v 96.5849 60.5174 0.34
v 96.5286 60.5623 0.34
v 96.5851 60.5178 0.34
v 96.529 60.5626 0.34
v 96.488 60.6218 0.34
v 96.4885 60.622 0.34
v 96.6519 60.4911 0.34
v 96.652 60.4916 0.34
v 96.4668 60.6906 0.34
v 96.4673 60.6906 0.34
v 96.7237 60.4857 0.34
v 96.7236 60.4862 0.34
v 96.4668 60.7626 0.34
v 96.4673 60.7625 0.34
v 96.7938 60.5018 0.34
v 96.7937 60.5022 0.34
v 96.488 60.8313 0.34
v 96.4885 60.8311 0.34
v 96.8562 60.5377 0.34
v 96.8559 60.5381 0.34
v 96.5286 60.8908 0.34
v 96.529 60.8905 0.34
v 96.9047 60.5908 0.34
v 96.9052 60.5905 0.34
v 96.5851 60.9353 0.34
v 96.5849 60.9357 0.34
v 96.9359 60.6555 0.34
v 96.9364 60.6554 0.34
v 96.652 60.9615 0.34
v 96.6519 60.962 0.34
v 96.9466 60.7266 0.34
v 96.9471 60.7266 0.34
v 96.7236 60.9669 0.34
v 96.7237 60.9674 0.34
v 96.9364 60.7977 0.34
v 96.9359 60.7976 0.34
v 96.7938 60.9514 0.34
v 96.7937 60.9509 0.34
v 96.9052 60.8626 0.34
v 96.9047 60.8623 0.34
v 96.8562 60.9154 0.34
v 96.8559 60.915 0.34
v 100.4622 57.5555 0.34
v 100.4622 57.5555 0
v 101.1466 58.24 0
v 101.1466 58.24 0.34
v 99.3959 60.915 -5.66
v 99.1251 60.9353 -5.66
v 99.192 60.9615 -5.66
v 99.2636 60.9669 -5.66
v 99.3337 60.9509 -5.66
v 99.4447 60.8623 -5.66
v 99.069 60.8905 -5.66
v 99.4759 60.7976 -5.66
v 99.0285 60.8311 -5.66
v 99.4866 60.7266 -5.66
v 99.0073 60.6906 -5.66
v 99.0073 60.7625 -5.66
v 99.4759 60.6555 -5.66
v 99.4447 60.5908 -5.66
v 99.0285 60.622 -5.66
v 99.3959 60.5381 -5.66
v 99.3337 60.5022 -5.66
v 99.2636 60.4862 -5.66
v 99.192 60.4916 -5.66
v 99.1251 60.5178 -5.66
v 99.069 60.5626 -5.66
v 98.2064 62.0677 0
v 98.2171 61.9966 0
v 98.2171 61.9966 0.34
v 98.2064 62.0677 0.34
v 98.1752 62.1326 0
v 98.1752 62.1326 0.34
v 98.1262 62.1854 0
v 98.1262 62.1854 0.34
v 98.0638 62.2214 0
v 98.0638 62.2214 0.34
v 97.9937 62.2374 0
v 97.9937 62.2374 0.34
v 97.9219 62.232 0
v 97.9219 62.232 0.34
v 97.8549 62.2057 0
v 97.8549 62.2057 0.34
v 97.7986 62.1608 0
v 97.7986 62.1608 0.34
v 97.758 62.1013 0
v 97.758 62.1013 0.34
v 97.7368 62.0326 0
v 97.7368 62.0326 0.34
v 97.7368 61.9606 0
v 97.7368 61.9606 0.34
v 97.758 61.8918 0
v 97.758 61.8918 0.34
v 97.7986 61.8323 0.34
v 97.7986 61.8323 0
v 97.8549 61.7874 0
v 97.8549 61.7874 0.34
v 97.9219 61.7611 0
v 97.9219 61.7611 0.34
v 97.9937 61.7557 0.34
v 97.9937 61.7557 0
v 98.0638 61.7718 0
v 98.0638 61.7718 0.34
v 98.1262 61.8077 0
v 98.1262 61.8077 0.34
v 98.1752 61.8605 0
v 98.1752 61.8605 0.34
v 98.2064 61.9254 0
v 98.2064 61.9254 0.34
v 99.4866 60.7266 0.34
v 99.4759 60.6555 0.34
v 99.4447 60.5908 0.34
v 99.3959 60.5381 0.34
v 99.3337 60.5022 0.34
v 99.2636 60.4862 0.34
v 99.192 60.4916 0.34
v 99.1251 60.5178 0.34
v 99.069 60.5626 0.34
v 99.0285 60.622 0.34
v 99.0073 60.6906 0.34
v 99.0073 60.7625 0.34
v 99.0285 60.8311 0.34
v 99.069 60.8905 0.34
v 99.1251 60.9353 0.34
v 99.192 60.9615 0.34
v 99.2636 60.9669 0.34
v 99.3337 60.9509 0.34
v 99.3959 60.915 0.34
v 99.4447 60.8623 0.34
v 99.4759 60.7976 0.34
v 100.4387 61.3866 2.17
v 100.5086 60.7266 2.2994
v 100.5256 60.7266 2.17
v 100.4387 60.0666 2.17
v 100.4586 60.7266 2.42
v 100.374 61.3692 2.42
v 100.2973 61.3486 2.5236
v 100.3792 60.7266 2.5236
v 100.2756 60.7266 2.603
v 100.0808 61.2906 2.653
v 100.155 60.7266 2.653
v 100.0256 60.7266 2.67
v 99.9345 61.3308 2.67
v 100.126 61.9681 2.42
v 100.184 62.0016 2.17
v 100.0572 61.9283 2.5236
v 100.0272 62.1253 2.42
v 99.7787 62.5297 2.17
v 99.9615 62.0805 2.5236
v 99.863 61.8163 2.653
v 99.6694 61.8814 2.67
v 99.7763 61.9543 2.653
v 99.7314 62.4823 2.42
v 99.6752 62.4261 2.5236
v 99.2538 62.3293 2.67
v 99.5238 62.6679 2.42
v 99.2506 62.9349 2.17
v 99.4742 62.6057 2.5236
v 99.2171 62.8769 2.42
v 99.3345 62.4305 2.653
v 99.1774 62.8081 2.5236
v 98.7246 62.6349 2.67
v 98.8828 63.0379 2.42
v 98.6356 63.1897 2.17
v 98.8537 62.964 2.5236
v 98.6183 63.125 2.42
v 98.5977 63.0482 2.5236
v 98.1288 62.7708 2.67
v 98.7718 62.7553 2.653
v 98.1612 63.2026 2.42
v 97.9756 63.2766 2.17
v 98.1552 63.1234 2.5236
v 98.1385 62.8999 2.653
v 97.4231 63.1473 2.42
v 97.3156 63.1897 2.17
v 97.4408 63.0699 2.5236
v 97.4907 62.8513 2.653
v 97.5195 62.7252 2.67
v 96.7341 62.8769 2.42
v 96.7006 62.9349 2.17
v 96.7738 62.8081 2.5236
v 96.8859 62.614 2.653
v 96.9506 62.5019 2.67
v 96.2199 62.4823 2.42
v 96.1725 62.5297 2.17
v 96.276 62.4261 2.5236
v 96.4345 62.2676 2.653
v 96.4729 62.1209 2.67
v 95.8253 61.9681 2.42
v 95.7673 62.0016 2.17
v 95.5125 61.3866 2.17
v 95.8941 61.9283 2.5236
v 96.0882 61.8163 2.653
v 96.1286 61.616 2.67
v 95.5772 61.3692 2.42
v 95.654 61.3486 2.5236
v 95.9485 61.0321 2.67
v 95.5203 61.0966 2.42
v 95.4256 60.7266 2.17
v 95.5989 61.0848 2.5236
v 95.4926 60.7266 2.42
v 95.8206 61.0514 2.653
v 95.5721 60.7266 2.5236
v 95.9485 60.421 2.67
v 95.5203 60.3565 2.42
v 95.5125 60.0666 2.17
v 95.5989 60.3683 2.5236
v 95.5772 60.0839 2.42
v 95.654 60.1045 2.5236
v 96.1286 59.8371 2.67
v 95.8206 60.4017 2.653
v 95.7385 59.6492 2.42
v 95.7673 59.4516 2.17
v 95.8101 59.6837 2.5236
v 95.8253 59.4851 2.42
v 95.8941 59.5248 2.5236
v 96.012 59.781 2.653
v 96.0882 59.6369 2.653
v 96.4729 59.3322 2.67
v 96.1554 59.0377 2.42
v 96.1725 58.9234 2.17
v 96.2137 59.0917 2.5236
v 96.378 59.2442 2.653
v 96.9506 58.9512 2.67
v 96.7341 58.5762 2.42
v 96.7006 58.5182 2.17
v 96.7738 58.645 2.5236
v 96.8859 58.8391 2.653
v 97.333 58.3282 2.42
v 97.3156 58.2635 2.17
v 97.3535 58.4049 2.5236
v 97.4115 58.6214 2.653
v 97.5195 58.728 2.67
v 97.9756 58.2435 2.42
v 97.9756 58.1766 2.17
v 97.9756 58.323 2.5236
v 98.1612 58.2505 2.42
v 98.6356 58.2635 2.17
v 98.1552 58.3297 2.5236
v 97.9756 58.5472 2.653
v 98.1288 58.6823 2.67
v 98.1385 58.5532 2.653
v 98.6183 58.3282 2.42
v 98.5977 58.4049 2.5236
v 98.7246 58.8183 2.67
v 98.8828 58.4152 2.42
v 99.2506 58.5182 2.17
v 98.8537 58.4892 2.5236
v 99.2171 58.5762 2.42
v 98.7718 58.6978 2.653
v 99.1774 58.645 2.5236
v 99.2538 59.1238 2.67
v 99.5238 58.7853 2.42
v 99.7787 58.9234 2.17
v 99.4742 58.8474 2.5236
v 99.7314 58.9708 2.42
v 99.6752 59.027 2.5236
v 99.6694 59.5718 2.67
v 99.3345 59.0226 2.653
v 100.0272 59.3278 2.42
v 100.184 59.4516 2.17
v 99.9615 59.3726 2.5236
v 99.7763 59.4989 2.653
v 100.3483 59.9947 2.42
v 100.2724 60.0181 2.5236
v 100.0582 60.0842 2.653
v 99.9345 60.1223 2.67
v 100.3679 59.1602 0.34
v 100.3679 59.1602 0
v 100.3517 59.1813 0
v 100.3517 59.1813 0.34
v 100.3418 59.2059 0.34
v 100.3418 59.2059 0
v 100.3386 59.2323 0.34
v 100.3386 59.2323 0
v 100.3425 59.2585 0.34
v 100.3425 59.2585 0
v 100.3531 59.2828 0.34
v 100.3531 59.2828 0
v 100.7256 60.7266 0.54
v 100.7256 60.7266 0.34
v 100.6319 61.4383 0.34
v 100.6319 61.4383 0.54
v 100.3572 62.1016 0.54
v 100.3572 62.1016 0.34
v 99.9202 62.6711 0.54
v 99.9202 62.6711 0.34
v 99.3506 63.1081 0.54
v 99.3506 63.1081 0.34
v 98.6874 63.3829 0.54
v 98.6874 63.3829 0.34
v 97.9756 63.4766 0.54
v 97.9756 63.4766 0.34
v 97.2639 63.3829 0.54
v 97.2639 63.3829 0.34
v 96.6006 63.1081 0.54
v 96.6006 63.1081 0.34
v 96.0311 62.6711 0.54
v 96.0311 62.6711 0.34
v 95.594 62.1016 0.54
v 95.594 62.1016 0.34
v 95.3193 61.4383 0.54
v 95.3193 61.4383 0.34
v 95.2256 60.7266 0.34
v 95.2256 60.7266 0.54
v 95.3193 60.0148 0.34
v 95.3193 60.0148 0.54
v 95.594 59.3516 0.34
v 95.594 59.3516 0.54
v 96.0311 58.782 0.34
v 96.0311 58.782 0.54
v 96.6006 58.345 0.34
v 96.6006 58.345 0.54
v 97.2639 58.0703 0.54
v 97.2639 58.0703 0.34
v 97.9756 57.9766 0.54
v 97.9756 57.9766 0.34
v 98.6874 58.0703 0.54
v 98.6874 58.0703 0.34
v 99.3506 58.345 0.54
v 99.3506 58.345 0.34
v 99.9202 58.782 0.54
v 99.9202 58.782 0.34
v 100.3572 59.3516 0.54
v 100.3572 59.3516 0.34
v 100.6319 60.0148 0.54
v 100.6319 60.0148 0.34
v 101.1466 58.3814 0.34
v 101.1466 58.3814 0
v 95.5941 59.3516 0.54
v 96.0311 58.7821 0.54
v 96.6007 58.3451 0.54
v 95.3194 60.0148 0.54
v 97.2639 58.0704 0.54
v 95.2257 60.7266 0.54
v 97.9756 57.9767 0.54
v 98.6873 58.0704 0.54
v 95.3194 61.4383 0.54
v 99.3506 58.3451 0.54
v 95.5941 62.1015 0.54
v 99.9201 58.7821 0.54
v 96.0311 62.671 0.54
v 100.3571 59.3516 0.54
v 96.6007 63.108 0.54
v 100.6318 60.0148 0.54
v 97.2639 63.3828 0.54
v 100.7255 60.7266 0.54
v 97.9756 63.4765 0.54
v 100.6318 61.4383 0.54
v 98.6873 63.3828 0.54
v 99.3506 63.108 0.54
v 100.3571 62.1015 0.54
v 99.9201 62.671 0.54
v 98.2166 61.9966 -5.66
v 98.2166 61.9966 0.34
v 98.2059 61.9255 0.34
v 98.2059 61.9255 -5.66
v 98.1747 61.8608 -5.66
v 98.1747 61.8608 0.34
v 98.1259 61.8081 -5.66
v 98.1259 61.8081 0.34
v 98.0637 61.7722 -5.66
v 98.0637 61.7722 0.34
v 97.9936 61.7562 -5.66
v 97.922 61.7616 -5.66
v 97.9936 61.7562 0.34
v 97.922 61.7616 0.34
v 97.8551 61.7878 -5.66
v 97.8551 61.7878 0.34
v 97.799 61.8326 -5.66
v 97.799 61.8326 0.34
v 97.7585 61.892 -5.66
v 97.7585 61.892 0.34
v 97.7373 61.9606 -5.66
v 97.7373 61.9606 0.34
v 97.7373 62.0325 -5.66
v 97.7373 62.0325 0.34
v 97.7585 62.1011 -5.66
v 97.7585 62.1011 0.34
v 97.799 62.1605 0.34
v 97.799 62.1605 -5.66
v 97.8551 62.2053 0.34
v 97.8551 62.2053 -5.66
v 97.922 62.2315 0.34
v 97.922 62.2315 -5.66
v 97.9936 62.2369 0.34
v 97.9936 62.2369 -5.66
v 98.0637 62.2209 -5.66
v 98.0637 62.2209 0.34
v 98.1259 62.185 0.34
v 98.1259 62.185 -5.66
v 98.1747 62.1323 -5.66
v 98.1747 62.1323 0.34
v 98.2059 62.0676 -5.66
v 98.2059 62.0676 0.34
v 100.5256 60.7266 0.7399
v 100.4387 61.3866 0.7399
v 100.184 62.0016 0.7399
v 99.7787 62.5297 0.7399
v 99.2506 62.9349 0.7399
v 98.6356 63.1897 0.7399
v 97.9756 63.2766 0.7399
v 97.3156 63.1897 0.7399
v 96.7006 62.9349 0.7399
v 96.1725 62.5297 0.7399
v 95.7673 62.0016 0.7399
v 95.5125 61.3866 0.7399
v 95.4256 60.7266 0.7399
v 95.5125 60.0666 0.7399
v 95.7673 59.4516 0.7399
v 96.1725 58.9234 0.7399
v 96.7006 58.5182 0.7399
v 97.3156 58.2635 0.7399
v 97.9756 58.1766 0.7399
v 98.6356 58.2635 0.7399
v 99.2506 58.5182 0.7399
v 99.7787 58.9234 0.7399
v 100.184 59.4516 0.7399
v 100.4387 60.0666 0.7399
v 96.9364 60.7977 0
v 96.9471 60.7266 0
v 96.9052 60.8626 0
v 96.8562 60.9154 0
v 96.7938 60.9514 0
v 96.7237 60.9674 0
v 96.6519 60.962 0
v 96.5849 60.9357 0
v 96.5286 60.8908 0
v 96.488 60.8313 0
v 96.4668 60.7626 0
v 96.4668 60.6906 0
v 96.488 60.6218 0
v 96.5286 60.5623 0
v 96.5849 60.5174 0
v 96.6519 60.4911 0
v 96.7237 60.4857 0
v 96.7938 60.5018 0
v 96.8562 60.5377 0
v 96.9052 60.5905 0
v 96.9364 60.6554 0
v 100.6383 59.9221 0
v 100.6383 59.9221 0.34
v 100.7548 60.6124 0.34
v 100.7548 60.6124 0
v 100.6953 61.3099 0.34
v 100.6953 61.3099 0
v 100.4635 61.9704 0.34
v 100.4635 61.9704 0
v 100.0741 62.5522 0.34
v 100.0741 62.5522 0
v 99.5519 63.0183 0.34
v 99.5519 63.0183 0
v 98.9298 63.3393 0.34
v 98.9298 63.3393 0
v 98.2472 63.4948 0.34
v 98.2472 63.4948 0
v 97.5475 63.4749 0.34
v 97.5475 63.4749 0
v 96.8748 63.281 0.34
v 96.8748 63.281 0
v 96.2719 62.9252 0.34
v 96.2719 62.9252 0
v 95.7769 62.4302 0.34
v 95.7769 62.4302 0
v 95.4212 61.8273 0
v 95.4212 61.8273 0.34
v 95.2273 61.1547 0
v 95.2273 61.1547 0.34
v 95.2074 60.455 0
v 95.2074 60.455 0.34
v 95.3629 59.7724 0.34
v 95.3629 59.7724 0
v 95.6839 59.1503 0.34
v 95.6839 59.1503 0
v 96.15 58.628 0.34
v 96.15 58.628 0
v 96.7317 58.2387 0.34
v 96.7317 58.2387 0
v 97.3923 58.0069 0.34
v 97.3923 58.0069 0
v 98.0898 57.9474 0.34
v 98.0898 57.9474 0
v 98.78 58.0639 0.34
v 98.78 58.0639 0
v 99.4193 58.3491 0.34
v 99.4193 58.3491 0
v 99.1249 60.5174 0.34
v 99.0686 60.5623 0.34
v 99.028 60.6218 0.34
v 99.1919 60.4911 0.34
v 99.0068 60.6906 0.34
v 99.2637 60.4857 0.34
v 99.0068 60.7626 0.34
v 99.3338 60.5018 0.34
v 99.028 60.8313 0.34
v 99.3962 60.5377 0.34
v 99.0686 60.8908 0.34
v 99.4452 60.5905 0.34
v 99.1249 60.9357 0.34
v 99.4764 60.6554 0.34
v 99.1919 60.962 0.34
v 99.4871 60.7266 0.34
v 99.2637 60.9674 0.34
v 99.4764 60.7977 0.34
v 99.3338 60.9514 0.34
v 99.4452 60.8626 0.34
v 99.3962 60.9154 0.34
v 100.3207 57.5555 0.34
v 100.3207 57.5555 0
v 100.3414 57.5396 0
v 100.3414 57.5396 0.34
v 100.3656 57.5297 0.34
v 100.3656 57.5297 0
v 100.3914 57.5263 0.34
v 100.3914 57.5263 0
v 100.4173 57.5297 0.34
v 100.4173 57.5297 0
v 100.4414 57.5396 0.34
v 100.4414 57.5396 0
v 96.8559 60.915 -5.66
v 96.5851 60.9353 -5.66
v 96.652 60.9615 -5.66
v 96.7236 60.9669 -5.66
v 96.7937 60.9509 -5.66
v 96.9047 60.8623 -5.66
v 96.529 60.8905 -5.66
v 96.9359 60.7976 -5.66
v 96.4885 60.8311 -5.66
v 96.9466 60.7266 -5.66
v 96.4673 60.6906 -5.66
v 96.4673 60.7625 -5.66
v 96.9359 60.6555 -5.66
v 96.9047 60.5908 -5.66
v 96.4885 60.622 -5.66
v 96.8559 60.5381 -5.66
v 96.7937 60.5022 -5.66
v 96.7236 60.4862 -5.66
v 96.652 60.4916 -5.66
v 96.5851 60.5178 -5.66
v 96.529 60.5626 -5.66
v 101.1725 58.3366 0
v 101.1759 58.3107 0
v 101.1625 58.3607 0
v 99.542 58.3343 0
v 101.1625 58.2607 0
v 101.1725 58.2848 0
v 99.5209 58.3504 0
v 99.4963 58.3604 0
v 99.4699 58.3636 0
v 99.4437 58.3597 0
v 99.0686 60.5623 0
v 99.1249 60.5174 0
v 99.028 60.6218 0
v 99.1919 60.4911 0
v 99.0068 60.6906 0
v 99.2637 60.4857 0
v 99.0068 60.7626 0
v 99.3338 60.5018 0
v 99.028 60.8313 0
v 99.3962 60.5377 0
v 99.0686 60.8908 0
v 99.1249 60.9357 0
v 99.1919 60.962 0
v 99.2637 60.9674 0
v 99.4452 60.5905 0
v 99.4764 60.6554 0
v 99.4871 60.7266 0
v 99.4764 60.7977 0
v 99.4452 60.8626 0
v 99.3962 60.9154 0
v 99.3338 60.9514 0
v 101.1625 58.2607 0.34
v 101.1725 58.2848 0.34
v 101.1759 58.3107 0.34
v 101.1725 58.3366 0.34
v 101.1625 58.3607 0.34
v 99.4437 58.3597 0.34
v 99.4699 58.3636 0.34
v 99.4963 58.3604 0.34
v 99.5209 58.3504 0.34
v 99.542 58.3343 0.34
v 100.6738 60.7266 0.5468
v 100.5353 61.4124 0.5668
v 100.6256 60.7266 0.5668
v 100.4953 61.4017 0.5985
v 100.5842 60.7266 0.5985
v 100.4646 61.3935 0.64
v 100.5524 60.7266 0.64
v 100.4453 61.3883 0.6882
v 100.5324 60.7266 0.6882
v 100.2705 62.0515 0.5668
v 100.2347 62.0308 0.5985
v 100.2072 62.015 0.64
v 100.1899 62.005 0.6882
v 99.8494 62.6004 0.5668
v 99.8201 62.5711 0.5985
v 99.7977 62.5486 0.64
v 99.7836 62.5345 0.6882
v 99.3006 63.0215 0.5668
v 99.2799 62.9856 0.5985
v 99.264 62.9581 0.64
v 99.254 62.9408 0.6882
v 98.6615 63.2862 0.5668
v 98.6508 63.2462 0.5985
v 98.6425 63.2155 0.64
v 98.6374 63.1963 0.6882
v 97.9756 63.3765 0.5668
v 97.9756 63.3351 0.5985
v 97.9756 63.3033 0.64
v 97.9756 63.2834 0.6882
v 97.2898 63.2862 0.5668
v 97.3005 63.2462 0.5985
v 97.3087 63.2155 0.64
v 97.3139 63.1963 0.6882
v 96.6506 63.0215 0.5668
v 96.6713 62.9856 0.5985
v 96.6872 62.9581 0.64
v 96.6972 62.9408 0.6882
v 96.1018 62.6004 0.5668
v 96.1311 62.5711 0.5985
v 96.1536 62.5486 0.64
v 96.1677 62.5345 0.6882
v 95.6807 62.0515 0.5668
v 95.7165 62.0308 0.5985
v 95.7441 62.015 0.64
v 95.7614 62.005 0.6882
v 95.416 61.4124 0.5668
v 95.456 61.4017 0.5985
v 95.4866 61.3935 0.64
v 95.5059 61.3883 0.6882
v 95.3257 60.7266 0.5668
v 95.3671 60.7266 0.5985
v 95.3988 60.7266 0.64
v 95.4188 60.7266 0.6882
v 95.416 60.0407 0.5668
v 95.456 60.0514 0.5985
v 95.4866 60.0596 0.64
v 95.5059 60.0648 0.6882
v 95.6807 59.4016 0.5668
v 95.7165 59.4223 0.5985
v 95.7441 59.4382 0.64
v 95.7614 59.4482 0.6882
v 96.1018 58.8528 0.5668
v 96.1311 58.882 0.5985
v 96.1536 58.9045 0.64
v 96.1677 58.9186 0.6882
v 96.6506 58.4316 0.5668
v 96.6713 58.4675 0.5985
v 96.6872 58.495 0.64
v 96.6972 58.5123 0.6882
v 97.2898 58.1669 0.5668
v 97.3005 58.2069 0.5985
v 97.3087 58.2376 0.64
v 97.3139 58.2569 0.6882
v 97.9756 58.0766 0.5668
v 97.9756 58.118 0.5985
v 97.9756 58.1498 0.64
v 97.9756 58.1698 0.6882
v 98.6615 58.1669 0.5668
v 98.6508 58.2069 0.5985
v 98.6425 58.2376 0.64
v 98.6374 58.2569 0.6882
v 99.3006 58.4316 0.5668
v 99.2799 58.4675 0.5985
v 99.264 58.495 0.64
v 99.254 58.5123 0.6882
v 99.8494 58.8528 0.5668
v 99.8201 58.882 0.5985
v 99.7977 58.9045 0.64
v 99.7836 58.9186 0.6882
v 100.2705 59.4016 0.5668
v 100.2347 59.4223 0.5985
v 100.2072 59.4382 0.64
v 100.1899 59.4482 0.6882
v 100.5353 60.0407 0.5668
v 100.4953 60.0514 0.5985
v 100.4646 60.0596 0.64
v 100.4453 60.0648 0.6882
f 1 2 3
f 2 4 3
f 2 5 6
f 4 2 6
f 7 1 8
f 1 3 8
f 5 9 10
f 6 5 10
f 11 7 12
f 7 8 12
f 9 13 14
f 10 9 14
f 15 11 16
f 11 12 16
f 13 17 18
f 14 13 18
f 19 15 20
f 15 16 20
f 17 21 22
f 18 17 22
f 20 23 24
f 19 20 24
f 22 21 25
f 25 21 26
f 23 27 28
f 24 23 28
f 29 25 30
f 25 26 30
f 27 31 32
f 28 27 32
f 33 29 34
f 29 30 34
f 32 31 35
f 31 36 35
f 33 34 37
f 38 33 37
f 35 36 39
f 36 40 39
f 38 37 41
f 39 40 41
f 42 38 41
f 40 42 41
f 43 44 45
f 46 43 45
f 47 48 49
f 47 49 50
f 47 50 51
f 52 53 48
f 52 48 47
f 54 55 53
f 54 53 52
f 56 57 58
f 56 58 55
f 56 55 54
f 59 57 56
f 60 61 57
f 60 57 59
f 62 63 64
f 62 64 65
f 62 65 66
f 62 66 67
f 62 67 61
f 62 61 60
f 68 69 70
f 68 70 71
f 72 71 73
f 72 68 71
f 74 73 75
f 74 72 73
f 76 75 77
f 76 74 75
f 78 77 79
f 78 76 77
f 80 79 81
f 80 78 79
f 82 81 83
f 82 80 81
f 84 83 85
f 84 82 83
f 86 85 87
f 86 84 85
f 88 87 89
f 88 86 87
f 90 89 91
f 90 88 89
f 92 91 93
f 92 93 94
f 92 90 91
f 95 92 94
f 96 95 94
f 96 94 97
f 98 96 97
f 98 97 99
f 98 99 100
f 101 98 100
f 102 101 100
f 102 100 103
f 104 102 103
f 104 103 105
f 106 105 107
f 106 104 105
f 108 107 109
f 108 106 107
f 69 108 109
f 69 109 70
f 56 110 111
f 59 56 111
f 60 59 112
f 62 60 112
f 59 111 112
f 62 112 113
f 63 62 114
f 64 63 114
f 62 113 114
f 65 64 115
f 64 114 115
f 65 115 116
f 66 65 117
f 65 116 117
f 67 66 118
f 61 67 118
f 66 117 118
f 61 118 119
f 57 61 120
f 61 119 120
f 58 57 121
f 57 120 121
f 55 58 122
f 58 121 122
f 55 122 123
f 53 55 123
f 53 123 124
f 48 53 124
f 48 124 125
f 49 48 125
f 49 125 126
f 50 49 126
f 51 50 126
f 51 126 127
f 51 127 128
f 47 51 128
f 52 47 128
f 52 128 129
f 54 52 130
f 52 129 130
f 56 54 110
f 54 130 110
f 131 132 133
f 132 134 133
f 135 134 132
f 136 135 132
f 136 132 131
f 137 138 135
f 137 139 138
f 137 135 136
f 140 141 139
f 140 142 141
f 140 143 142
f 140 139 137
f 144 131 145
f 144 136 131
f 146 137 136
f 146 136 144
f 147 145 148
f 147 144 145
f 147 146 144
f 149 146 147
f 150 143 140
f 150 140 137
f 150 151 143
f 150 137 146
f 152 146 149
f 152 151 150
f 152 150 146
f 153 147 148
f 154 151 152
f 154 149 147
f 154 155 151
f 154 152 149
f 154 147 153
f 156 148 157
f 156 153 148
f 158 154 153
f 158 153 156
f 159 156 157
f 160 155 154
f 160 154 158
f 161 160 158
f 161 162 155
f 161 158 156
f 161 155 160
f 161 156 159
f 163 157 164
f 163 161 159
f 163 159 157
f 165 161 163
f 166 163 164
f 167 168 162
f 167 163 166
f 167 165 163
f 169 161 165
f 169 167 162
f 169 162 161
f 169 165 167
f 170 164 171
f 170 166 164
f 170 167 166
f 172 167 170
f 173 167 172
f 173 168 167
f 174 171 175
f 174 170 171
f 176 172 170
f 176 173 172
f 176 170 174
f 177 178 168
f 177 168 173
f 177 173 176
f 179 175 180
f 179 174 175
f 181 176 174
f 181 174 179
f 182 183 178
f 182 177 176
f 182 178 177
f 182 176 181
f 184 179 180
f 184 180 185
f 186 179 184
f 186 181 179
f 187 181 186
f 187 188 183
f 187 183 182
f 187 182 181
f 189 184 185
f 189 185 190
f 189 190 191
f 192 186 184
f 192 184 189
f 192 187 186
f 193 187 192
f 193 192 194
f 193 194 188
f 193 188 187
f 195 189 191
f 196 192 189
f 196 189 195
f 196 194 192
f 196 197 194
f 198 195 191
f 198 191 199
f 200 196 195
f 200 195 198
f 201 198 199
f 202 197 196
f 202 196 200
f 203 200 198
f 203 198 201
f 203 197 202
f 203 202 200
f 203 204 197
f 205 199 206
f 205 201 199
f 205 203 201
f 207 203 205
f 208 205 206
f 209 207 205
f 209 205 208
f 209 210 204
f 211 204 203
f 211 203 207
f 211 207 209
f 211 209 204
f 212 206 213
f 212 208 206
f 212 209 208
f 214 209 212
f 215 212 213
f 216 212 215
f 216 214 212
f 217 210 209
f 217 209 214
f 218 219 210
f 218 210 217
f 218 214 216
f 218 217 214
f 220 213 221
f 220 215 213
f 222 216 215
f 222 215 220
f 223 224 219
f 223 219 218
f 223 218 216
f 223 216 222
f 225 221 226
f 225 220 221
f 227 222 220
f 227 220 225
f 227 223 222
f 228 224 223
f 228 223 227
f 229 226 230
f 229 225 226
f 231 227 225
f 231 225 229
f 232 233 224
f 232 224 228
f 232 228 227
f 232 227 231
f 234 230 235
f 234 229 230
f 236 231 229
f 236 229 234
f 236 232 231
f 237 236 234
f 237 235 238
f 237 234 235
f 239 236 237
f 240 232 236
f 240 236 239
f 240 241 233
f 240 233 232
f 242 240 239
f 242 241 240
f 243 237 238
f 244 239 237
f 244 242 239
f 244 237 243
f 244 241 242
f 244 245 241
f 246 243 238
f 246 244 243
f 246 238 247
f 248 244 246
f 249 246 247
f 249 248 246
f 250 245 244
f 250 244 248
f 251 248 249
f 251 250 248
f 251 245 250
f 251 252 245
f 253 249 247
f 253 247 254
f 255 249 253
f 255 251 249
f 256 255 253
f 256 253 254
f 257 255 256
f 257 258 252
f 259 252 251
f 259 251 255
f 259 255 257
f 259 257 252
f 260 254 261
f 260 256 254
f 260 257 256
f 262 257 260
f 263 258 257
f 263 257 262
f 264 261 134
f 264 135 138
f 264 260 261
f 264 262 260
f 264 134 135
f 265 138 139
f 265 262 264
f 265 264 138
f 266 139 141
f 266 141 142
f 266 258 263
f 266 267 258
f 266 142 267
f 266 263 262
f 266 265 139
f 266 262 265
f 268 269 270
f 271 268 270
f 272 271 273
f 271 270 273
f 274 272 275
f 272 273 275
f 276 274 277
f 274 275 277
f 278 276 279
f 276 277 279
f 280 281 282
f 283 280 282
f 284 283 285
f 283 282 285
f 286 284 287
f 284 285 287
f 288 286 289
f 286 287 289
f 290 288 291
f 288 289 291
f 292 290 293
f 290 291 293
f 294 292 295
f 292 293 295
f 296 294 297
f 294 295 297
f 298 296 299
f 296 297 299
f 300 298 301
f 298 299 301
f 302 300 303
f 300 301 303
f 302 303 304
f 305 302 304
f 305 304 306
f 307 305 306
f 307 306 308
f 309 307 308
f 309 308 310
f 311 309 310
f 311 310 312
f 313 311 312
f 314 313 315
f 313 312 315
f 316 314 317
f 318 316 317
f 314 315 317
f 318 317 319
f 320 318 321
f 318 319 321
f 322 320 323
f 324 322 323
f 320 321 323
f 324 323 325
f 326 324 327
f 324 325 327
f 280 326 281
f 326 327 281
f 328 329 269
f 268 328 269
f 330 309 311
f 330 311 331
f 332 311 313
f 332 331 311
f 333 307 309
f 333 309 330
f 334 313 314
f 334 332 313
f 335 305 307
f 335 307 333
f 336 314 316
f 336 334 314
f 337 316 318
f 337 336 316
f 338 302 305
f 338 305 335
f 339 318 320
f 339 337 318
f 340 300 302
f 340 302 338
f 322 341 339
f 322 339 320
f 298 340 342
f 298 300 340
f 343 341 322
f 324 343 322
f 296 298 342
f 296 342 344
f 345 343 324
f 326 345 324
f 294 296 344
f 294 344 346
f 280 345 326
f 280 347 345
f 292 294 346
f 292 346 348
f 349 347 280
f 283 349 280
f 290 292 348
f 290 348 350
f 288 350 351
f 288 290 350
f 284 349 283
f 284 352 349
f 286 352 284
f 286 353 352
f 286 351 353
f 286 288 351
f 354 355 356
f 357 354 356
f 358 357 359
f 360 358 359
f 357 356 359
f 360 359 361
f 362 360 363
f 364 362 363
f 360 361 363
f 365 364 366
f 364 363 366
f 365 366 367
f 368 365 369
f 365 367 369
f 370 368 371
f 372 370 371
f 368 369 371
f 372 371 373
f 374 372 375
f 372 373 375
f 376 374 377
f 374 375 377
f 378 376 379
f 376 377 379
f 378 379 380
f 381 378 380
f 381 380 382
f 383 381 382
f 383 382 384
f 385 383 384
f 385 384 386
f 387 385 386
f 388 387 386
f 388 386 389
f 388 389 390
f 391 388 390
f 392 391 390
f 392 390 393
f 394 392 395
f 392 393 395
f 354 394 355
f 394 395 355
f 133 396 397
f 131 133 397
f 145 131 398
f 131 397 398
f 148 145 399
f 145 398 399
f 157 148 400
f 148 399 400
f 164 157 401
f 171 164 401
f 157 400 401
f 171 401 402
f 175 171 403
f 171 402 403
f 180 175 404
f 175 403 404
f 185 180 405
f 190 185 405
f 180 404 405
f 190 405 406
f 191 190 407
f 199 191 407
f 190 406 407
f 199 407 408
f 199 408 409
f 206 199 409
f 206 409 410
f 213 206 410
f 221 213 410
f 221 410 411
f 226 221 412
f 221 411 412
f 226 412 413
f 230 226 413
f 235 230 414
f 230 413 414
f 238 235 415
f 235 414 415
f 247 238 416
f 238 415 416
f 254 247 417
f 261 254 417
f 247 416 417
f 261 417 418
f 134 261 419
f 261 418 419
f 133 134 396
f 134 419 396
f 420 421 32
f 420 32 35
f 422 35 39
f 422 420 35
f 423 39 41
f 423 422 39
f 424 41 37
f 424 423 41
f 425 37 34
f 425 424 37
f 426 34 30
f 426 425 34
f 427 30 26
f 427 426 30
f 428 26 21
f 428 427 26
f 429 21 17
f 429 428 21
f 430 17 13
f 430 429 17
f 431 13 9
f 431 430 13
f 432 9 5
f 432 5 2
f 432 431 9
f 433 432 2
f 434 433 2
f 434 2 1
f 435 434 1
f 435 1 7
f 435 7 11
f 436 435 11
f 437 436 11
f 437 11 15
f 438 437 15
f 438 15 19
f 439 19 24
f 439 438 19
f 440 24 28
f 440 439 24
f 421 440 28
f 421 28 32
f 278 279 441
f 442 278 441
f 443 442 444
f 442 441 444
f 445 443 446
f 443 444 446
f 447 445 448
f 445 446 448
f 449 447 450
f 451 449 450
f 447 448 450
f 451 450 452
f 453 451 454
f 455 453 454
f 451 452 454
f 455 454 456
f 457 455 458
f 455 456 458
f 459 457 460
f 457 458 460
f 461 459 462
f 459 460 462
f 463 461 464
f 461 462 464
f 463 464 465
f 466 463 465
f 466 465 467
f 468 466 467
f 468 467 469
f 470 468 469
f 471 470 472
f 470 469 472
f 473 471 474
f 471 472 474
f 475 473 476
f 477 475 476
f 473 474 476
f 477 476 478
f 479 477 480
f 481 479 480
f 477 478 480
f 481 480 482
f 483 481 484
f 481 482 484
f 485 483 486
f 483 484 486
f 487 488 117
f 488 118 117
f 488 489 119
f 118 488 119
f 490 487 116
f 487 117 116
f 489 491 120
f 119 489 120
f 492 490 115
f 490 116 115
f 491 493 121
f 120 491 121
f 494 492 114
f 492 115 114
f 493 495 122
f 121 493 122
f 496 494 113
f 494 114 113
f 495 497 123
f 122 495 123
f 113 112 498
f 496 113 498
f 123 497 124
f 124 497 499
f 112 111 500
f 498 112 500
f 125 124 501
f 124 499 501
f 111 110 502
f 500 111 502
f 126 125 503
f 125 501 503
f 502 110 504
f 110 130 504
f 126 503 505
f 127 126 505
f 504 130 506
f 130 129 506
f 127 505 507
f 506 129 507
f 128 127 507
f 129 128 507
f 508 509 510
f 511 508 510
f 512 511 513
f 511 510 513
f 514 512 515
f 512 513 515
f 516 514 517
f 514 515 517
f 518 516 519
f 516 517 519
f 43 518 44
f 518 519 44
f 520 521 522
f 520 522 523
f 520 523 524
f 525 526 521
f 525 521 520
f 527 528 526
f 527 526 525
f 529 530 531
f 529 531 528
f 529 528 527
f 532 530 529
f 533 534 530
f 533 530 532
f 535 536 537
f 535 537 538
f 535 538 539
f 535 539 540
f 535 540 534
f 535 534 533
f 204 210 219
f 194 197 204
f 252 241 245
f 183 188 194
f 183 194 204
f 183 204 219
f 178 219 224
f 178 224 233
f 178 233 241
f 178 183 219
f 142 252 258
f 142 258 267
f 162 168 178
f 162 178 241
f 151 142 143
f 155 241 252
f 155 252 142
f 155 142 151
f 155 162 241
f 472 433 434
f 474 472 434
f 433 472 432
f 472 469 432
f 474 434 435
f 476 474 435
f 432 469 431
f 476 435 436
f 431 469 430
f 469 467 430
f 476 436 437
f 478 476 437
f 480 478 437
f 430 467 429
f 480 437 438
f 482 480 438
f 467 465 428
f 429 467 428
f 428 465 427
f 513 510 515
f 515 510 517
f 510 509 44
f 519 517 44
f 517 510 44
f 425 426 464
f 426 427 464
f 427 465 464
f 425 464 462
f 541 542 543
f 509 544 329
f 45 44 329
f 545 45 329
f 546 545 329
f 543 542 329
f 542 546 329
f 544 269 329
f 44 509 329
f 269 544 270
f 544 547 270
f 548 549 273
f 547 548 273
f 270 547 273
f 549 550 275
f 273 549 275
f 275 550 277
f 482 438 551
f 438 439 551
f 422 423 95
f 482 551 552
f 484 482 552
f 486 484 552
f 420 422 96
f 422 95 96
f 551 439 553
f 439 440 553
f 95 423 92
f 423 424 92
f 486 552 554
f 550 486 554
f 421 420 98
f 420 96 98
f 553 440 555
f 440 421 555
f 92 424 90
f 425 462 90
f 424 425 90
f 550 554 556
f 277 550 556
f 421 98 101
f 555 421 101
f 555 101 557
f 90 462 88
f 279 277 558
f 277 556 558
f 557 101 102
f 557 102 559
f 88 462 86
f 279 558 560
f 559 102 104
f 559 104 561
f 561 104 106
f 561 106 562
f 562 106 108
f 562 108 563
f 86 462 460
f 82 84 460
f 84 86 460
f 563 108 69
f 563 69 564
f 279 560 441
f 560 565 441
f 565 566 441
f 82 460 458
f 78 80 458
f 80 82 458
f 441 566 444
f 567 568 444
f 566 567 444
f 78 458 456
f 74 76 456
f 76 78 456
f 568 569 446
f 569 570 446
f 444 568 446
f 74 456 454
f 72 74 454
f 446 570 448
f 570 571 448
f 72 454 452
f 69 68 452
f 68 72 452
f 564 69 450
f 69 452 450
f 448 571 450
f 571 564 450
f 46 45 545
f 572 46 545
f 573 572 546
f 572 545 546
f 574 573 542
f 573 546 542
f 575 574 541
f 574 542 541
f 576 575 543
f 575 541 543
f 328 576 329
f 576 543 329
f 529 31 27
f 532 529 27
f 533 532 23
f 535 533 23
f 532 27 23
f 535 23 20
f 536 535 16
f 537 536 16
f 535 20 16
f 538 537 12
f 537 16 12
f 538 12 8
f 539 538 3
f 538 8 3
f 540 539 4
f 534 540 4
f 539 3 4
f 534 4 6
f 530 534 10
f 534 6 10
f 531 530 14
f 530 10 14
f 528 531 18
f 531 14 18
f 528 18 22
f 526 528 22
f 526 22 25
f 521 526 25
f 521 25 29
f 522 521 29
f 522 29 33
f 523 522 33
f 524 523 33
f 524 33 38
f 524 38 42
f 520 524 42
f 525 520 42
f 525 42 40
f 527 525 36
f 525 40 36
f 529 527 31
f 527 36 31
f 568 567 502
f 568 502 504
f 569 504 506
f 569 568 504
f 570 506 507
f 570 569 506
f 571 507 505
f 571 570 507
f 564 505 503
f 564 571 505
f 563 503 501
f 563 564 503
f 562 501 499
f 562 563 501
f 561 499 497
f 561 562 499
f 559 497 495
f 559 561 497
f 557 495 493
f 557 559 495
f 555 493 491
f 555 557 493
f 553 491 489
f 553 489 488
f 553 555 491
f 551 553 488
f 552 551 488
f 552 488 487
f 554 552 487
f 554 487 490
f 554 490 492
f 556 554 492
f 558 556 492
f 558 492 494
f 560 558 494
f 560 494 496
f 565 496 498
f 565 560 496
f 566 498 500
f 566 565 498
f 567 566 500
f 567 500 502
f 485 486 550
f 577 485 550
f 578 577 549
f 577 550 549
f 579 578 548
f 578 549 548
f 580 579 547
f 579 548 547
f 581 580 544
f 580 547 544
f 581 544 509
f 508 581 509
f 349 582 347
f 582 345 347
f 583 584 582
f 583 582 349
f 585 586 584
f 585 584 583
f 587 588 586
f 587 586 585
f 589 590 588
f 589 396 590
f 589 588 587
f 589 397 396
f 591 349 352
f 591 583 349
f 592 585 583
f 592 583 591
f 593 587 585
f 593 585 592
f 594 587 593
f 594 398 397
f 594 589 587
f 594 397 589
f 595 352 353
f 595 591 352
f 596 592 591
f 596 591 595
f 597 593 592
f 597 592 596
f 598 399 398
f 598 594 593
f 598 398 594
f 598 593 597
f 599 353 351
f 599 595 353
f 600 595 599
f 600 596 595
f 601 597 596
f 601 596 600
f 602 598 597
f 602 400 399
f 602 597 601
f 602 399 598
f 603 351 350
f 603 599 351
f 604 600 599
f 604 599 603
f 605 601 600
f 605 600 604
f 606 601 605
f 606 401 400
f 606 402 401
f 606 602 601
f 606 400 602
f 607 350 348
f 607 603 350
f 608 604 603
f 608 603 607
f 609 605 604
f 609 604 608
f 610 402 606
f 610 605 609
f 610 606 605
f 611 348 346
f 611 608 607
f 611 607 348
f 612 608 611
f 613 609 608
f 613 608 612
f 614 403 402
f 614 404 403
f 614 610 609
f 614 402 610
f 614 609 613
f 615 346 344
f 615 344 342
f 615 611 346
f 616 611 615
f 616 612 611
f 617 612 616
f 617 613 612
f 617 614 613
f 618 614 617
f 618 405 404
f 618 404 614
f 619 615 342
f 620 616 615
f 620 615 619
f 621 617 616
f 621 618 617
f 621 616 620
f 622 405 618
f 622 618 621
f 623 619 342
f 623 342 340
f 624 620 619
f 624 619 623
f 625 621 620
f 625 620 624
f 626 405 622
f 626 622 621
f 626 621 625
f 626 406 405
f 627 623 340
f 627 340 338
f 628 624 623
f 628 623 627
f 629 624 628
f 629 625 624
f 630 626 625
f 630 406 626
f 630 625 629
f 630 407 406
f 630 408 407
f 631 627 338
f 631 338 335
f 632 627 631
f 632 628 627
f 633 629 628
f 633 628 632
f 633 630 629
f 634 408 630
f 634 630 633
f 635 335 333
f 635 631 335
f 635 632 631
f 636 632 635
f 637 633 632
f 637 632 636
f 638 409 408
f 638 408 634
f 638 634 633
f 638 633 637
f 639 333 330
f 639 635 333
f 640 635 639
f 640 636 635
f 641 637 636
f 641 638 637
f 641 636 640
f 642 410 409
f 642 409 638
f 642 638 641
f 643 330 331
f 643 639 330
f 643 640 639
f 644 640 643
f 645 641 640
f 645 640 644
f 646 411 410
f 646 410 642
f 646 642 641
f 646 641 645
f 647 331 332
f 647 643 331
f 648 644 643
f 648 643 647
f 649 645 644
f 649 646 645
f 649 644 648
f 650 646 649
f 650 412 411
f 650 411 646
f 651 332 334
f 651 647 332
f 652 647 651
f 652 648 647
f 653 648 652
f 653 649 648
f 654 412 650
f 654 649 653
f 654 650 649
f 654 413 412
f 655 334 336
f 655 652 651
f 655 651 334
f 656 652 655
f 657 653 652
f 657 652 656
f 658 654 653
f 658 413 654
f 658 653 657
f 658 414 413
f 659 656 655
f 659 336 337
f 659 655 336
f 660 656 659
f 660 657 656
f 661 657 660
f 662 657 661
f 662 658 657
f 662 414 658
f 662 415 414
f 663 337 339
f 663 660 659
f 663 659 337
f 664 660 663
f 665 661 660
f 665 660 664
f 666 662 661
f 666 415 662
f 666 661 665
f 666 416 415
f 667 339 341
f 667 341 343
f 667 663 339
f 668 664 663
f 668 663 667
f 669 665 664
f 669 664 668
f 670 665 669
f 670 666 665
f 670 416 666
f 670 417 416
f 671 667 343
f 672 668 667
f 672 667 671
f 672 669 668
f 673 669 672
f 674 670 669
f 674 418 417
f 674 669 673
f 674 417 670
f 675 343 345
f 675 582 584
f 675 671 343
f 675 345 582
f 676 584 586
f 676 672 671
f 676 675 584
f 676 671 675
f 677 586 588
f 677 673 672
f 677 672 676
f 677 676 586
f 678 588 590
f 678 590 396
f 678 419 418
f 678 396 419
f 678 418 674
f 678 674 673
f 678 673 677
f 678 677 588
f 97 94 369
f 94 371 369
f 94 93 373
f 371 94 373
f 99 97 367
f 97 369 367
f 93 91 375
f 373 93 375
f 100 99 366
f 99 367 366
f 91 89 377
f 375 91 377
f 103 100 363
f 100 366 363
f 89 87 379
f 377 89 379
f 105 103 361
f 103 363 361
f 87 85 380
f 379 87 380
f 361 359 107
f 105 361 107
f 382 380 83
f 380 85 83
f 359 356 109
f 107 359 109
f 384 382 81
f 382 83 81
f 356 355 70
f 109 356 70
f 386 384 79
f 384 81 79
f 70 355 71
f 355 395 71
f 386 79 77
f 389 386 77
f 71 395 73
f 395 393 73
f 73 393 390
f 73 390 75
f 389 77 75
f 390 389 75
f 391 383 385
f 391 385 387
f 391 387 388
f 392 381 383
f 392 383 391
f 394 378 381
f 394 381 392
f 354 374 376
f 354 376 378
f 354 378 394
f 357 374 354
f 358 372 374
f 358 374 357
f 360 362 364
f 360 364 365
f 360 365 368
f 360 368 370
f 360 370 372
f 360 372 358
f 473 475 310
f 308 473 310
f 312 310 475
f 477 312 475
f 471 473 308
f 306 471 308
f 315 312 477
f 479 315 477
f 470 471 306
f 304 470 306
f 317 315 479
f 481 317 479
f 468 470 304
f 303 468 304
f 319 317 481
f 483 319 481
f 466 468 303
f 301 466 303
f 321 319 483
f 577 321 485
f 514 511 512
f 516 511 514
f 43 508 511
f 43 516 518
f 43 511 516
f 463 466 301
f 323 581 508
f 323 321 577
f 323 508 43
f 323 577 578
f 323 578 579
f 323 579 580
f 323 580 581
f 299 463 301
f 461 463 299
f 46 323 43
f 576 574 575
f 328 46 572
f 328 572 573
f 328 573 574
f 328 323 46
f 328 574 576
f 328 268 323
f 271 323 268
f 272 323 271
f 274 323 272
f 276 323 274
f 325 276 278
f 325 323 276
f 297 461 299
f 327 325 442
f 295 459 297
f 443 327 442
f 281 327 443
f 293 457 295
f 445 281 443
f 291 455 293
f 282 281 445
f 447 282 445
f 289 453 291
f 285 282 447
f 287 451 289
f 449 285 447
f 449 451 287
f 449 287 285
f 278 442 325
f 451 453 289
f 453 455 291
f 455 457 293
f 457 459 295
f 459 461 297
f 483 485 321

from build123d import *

# Parameters (mm, degrees)
SKETCH1_R           = 0.2415
BOSS_EXTRUDE1_DEPTH = 0.34
SKETCH2_R           = 2.75
BOSS_EXTRUDE2_DEPTH = 0.2
SKETCH3_R           = 2.55
BOSS_EXTRUDE3_DEPTH = 2.13
FILLET1_R           = 0.2
FILLET2_R           = 0.5
SKETCH4_R           = 0.241
BOSS_EXTRUDE4_DEPTH = 6


with BuildPart() as part:
    # Sketch1 → Boss-Extrude1 (new body)
    with BuildSketch(Plane.XY):
        with BuildLine():
            Line((99.541959491, 58.334320384), (100.320738424, 57.55554145))
            ThreePointArc((100.320738424, 57.55554145), (100.391449102, 57.526252128), (100.462159781, 57.55554145))
            Line((100.462159781, 57.55554145), (101.146639145, 58.240020814))
            ThreePointArc((101.146639145, 58.240020814), (101.175928467, 58.310731493), (101.146639145, 58.381442171))
            Line((101.146639145, 58.381442171), (100.367860211, 59.160221104))
            ThreePointArc((100.367860211, 59.160221104), (100.339288016, 59.218977235), (100.353096237, 59.282836347))
            ThreePointArc((100.353096237, 59.282836347), (96.008801273, 62.693379322), (99.419344248, 58.349084358))
            ThreePointArc((99.419344248, 58.349084358), (99.48320336, 58.362892578), (99.541959491, 58.334320384))
        make_face()
        with Locations((97.975618784, 61.99656181)):
            Circle(SKETCH1_R, mode=Mode.SUBTRACT)
        with Locations((99.245618784, 60.72656181)):
            Circle(SKETCH1_R, mode=Mode.SUBTRACT)
        with Locations((96.705618784, 60.72656181)):
            Circle(SKETCH1_R, mode=Mode.SUBTRACT)
    extrude(amount=BOSS_EXTRUDE1_DEPTH)

    # Sketch2 → Boss-Extrude2 (add)
    with BuildSketch(Plane.XY.offset(0.34)):
        with Locations((97.975618784, 60.72656181)):
            Circle(SKETCH2_R)
    extrude(amount=BOSS_EXTRUDE2_DEPTH)

    # Sketch3 → Boss-Extrude3 (add)
    with BuildSketch(Plane.XY.offset(0.54)):
        with Locations((97.975618784, 60.72656181)):
            Circle(SKETCH3_R)
    extrude(amount=BOSS_EXTRUDE3_DEPTH)

    # Fillet1
    fillet1_edges = [part.edges().sort_by_distance(p)[0] for p in [
        (95.425618784, 60.72656181, 0.54),
    ]]
    fillet(fillet1_edges, radius=FILLET1_R - 0.0001)  # a hair under: the kernel refuses the full size

    # Fillet2
    fillet2_edges = [part.edges().sort_by_distance(p)[0] for p in [
        (95.425618784, 60.72656181, 2.67),
    ]]
    fillet(fillet2_edges, radius=FILLET2_R)

    # Sketch4 → Boss-Extrude4 (add)
    with BuildSketch(Plane(origin=(0, 0, 0.34), x_dir=(-1, 0, 0), z_dir=(0, 0, -1))):
        with Locations(Location((-99.245618784, 60.72656181, 0), (0, 0, 180))):
            Circle(SKETCH4_R)
        with Locations(Location((-97.975618784, 61.99656181, 0), (0, 0, 180))):
            Circle(SKETCH4_R)
        with Locations(Location((-96.705618784, 60.72656181, 0), (0, 0, 180))):
            Circle(SKETCH4_R)
    extrude(amount=BOSS_EXTRUDE4_DEPTH)


solid = part.part
